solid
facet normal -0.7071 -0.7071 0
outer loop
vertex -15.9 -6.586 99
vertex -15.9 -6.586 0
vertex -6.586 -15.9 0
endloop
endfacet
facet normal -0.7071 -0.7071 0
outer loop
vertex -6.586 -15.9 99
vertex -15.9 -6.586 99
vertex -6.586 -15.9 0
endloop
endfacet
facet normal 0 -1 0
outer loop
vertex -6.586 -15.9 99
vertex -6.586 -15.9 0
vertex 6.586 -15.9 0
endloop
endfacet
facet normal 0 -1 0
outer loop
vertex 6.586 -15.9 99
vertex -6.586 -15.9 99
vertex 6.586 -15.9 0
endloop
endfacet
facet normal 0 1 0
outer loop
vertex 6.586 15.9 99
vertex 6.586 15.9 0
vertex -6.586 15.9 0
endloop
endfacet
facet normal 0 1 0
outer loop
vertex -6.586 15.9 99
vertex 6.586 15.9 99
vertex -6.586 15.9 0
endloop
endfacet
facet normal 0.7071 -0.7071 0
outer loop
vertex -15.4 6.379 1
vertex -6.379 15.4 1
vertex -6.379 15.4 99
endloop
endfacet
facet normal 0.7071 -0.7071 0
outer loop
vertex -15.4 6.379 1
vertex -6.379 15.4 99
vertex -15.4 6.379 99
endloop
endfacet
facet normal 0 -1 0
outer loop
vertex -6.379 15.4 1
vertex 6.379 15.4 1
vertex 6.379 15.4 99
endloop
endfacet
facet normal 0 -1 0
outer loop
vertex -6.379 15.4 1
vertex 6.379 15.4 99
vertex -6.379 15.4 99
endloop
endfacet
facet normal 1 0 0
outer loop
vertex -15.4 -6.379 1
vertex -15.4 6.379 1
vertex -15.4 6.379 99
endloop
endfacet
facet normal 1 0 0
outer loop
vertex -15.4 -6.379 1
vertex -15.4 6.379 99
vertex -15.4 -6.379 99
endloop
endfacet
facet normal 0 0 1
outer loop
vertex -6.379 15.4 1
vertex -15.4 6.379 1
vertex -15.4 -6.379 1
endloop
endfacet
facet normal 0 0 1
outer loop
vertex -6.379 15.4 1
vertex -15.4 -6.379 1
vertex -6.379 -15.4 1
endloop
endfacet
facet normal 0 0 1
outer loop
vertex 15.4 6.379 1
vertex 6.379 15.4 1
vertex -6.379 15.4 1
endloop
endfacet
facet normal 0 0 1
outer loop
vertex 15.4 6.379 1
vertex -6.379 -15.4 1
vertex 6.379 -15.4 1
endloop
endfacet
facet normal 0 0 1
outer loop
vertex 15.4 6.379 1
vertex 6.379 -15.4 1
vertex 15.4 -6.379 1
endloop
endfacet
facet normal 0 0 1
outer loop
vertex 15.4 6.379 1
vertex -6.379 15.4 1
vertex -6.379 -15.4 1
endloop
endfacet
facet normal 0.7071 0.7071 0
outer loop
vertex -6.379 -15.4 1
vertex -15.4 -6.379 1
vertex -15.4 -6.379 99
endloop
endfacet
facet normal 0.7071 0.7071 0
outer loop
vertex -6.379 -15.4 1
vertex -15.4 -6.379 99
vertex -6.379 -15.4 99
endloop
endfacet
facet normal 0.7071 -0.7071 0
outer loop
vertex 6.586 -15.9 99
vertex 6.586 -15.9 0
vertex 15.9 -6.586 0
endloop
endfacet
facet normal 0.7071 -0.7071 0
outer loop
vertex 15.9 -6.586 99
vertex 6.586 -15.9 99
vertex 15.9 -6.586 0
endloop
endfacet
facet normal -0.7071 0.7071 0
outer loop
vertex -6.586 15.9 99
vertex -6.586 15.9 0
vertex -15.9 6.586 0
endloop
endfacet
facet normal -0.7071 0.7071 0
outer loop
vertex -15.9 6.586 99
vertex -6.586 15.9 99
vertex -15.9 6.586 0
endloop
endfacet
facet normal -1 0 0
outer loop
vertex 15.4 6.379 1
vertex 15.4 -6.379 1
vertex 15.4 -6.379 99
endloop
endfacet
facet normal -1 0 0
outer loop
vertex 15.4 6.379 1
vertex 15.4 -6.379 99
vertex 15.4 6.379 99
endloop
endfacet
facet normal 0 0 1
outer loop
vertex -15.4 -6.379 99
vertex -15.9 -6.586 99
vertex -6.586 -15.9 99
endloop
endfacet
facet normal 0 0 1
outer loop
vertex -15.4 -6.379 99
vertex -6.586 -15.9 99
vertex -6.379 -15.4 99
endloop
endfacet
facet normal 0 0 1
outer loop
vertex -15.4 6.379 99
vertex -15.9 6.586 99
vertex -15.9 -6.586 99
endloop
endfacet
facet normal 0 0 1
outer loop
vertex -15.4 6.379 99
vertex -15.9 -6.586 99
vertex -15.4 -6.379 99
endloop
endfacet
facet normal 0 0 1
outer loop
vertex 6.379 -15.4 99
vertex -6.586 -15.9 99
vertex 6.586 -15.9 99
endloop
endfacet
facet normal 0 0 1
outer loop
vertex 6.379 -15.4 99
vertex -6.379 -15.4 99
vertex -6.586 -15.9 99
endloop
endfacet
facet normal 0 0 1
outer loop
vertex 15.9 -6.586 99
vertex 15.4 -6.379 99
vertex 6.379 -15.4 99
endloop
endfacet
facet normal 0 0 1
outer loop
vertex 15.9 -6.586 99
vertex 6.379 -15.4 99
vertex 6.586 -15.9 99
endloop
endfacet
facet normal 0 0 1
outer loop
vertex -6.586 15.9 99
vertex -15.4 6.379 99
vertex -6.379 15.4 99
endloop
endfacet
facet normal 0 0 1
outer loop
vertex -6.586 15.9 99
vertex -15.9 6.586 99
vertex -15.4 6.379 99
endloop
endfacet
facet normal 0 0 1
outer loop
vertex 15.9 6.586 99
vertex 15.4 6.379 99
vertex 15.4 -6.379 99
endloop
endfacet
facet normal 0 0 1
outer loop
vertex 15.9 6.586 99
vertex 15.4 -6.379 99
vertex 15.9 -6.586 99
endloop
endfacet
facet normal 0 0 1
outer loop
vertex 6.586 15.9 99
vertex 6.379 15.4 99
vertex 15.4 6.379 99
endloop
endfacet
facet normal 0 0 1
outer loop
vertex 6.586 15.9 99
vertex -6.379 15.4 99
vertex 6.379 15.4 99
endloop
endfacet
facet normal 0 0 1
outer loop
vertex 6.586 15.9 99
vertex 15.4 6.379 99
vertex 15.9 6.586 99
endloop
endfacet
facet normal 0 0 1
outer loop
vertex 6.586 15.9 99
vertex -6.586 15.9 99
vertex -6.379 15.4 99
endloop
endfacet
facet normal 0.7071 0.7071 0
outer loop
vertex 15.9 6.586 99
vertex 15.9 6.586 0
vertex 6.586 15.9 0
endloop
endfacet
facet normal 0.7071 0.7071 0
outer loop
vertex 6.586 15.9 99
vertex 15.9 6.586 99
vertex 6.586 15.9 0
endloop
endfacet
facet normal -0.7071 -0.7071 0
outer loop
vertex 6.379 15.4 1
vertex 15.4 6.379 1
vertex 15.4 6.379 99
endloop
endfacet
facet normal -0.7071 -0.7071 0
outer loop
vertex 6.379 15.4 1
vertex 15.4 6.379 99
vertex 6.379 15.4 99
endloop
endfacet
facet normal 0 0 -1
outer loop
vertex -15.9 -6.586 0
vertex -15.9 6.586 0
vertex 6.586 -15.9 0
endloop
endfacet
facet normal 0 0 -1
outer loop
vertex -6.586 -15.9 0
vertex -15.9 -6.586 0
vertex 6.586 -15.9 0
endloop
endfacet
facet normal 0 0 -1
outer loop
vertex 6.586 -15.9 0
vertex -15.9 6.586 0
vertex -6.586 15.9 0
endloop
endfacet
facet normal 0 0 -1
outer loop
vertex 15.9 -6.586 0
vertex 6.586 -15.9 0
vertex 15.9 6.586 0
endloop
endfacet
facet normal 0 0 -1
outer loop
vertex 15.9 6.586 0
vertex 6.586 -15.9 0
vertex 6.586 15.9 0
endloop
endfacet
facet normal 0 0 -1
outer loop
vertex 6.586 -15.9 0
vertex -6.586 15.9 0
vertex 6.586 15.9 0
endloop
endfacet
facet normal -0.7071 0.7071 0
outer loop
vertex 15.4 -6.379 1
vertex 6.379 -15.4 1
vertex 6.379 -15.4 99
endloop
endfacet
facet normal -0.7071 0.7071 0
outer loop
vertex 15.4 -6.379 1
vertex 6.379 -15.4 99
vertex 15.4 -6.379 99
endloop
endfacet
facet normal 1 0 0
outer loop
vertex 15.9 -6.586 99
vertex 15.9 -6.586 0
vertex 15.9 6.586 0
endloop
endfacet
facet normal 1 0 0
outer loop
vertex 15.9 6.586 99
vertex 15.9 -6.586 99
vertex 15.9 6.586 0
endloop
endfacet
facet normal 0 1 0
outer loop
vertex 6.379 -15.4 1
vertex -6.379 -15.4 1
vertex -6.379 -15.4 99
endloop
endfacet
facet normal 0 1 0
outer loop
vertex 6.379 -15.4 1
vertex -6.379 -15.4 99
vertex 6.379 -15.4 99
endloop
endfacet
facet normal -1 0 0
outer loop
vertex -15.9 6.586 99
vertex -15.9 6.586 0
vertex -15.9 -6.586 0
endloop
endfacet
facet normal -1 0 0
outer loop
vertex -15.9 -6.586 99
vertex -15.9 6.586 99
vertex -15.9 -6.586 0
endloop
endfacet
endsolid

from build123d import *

# Parameters (mm, degrees)
PAD006_DEPTH = 1
PAD005_DEPTH = 98


with BuildPart() as cooler_container_lid001:
    # Sketch007 → Pad006 (new body)
    with BuildSketch(Plane.XY):
        Polygon((15.9, 6.585996), (6.585996, 15.9), (-6.585996, 15.9), (-15.9, 6.585996), (-15.9, -6.585996), (-6.585996, -15.9), (6.585996, -15.9), (15.9, -6.585996), align=None)
    extrude(amount=PAD006_DEPTH)


with BuildPart() as cooler_walls_down:
    # Sketch006 → Pad005 (new body)
    with BuildSketch(Plane.XY):
        Polygon((15.9, 6.585996), (6.585996, 15.9), (-6.585996, 15.9), (-15.9, 6.585996), (-15.9, -6.585996), (-6.585996, -15.9), (6.585996, -15.9), (15.9, -6.585996), align=None)
        Polygon((15.4, 6.378889), (6.378889, 15.4), (-6.378889, 15.4), (-15.4, 6.378889), (-15.4, -6.378889), (-6.378889, -15.4), (6.378889, -15.4), (15.4, -6.378889), align=None, mode=Mode.SUBTRACT)
    extrude(amount=PAD005_DEPTH)


with BuildPart() as cooler_walls_down_1:
    # Body007 placement: moved
    add(cooler_walls_down.part.moved(Location((0, 0, 1))))

    # Fusion: union cooler_container_lid001
    add(cooler_container_lid001.part)


solid = cooler_walls_down_1.part
